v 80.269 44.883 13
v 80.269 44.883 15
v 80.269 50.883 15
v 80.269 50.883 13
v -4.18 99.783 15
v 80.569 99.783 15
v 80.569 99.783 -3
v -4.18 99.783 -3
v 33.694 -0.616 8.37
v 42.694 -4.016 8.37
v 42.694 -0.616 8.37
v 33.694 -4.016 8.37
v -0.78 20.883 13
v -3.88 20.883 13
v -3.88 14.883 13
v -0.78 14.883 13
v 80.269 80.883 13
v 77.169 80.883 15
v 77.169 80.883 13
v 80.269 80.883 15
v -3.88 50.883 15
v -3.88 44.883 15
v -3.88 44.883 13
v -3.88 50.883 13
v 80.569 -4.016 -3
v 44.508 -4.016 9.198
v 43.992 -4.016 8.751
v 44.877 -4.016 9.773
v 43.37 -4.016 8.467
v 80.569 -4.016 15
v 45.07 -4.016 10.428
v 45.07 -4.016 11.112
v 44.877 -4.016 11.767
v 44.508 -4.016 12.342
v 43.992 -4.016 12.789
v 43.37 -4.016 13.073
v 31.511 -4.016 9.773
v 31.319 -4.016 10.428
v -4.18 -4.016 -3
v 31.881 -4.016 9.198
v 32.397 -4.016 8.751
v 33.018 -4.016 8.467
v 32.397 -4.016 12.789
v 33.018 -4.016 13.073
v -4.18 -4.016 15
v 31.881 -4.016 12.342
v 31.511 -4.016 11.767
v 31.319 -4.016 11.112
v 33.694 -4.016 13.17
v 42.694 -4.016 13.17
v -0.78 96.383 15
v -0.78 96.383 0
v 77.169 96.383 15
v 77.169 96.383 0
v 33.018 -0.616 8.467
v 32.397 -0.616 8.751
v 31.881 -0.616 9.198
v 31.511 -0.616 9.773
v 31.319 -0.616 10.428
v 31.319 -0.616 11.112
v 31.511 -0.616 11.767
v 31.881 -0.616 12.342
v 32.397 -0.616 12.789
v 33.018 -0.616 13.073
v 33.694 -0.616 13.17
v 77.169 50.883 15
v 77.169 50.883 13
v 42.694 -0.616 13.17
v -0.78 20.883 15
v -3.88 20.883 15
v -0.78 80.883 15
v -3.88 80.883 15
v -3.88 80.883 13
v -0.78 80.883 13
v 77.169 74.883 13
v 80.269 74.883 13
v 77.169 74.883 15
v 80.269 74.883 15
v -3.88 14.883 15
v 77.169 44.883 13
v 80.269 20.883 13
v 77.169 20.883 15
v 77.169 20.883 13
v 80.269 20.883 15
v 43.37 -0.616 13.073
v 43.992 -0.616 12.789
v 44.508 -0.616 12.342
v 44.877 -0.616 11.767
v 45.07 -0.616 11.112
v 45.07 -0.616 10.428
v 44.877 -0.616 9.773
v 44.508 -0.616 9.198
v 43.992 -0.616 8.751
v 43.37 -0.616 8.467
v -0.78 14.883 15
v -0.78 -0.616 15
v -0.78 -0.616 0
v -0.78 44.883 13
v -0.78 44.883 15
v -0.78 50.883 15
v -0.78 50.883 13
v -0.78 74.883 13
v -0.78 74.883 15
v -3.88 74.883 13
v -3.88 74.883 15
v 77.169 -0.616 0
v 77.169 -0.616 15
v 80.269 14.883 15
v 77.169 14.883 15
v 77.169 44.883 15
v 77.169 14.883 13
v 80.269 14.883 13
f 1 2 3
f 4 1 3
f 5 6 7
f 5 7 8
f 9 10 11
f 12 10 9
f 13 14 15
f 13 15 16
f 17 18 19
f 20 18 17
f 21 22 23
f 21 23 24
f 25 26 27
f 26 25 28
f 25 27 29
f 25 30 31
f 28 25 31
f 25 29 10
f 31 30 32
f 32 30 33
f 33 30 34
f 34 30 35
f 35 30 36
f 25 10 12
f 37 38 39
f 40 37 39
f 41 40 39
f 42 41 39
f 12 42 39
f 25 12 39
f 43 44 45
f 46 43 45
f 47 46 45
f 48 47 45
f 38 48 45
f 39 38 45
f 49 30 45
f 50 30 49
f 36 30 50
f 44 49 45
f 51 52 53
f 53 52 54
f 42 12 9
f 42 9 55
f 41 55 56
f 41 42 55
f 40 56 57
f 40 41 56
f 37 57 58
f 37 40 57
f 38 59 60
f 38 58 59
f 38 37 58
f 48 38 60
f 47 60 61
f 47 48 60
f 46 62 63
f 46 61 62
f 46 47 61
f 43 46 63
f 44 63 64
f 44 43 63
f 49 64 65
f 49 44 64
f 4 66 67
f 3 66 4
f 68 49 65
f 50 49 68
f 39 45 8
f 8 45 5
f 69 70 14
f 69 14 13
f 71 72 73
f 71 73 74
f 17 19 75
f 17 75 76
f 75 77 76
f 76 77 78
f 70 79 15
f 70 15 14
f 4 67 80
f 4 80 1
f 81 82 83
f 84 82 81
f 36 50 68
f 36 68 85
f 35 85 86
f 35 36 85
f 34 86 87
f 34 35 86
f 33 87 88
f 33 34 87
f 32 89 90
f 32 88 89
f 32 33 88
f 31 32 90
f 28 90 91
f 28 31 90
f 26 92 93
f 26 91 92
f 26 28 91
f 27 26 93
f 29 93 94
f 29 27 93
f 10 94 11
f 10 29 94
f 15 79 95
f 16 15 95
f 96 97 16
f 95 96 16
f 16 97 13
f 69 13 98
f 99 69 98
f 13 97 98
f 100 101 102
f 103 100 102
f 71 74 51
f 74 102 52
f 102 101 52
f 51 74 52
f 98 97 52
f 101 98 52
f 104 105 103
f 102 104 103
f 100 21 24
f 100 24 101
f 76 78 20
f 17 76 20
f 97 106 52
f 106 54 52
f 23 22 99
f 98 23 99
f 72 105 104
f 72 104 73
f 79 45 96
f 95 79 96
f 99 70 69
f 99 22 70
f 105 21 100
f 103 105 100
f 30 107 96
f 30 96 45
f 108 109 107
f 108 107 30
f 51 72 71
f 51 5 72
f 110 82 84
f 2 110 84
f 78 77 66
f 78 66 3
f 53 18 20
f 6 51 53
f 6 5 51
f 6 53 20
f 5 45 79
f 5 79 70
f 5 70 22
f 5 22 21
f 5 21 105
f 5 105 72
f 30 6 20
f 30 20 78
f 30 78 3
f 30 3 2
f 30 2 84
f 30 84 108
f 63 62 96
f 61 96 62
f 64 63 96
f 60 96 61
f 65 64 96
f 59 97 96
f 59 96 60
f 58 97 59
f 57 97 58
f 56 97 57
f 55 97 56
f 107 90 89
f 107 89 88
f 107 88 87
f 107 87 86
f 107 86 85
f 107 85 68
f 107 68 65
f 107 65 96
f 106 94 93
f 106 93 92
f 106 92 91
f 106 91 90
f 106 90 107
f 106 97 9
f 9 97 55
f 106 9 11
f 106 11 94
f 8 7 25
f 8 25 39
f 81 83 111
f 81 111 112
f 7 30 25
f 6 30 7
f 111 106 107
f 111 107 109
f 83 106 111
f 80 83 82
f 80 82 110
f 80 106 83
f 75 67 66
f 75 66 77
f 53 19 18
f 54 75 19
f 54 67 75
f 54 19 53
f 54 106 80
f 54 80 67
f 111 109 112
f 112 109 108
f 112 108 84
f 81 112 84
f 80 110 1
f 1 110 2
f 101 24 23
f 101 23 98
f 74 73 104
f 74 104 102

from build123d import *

# Parameters (mm, degrees)
MODEL_W             = 84.74935
MODEL_H             = 103.79946
MODEL_W_2           = 77.94935
MODEL_H_2           = 96.99946
EXTRUDE_2_DEPTH     = 15
SKETCH_1_W          = 84.74935
SKETCH_1_H          = 103.79946
EXTRUDE_3_DEPTH     = 3
SKETCH_2_W          = 3.1
SKETCH_2_H          = 6
CUT_EXTRUDE_1_DEPTH = 2
CUT_EXTRUDE_3_DEPTH = 10


with BuildPart() as part:
    # Model → 凸台-拉伸2 (new body)
    with BuildSketch(Plane.XY):
        with Locations((38.194325, 47.88337)):
            Rectangle(MODEL_W, MODEL_H)
        with Locations((38.194325, 47.88337)):
            Rectangle(MODEL_W_2, MODEL_H_2, mode=Mode.SUBTRACT)
    extrude(amount=EXTRUDE_2_DEPTH)

    # 草图1 → 凸台-拉伸3 (add)
    with BuildSketch(Plane(origin=(0, 0, 0), x_dir=(-1, 0, 0), z_dir=(0, 0, -1))):
        with Locations((-38.194325, 47.88337)):
            Rectangle(SKETCH_1_W, SKETCH_1_H)
    extrude(amount=EXTRUDE_3_DEPTH)

    # 草图2 → 切除-拉伸1 (cut)
    with BuildSketch(Plane.XY.offset(15)):
        with Locations((-2.33035, 77.88337)):
            Rectangle(SKETCH_2_W, SKETCH_2_H)
        with Locations((-2.33035, 47.88337)):
            Rectangle(SKETCH_2_W, SKETCH_2_H)
        with Locations((-2.33035, 17.88337)):
            Rectangle(SKETCH_2_W, SKETCH_2_H)
        with Locations((78.719, 17.88337)):
            Rectangle(SKETCH_2_W, SKETCH_2_H)
        with Locations((78.719, 47.88337)):
            Rectangle(SKETCH_2_W, SKETCH_2_H)
        with Locations((78.719, 77.88337)):
            Rectangle(SKETCH_2_W, SKETCH_2_H)
    extrude(amount=-CUT_EXTRUDE_1_DEPTH, mode=Mode.SUBTRACT)

    # 草图4 → 切除-拉伸3 (cut)
    with BuildSketch(Plane.XZ.offset(7.21636)):
        with BuildLine():
            Line((33.694325, 13.169990539), (42.694325, 13.169990539))
            ThreePointArc((42.694325, 13.169990539), (45.094325, 10.769990539), (42.694325, 8.369990539))
            Line((42.694325, 8.369990539), (33.694325, 8.369990539))
            ThreePointArc((33.694325, 8.369990539), (31.294325, 10.769990539), (33.694325, 13.169990539))
        make_face()
    extrude(amount=-CUT_EXTRUDE_3_DEPTH, mode=Mode.SUBTRACT)


solid = part.part
